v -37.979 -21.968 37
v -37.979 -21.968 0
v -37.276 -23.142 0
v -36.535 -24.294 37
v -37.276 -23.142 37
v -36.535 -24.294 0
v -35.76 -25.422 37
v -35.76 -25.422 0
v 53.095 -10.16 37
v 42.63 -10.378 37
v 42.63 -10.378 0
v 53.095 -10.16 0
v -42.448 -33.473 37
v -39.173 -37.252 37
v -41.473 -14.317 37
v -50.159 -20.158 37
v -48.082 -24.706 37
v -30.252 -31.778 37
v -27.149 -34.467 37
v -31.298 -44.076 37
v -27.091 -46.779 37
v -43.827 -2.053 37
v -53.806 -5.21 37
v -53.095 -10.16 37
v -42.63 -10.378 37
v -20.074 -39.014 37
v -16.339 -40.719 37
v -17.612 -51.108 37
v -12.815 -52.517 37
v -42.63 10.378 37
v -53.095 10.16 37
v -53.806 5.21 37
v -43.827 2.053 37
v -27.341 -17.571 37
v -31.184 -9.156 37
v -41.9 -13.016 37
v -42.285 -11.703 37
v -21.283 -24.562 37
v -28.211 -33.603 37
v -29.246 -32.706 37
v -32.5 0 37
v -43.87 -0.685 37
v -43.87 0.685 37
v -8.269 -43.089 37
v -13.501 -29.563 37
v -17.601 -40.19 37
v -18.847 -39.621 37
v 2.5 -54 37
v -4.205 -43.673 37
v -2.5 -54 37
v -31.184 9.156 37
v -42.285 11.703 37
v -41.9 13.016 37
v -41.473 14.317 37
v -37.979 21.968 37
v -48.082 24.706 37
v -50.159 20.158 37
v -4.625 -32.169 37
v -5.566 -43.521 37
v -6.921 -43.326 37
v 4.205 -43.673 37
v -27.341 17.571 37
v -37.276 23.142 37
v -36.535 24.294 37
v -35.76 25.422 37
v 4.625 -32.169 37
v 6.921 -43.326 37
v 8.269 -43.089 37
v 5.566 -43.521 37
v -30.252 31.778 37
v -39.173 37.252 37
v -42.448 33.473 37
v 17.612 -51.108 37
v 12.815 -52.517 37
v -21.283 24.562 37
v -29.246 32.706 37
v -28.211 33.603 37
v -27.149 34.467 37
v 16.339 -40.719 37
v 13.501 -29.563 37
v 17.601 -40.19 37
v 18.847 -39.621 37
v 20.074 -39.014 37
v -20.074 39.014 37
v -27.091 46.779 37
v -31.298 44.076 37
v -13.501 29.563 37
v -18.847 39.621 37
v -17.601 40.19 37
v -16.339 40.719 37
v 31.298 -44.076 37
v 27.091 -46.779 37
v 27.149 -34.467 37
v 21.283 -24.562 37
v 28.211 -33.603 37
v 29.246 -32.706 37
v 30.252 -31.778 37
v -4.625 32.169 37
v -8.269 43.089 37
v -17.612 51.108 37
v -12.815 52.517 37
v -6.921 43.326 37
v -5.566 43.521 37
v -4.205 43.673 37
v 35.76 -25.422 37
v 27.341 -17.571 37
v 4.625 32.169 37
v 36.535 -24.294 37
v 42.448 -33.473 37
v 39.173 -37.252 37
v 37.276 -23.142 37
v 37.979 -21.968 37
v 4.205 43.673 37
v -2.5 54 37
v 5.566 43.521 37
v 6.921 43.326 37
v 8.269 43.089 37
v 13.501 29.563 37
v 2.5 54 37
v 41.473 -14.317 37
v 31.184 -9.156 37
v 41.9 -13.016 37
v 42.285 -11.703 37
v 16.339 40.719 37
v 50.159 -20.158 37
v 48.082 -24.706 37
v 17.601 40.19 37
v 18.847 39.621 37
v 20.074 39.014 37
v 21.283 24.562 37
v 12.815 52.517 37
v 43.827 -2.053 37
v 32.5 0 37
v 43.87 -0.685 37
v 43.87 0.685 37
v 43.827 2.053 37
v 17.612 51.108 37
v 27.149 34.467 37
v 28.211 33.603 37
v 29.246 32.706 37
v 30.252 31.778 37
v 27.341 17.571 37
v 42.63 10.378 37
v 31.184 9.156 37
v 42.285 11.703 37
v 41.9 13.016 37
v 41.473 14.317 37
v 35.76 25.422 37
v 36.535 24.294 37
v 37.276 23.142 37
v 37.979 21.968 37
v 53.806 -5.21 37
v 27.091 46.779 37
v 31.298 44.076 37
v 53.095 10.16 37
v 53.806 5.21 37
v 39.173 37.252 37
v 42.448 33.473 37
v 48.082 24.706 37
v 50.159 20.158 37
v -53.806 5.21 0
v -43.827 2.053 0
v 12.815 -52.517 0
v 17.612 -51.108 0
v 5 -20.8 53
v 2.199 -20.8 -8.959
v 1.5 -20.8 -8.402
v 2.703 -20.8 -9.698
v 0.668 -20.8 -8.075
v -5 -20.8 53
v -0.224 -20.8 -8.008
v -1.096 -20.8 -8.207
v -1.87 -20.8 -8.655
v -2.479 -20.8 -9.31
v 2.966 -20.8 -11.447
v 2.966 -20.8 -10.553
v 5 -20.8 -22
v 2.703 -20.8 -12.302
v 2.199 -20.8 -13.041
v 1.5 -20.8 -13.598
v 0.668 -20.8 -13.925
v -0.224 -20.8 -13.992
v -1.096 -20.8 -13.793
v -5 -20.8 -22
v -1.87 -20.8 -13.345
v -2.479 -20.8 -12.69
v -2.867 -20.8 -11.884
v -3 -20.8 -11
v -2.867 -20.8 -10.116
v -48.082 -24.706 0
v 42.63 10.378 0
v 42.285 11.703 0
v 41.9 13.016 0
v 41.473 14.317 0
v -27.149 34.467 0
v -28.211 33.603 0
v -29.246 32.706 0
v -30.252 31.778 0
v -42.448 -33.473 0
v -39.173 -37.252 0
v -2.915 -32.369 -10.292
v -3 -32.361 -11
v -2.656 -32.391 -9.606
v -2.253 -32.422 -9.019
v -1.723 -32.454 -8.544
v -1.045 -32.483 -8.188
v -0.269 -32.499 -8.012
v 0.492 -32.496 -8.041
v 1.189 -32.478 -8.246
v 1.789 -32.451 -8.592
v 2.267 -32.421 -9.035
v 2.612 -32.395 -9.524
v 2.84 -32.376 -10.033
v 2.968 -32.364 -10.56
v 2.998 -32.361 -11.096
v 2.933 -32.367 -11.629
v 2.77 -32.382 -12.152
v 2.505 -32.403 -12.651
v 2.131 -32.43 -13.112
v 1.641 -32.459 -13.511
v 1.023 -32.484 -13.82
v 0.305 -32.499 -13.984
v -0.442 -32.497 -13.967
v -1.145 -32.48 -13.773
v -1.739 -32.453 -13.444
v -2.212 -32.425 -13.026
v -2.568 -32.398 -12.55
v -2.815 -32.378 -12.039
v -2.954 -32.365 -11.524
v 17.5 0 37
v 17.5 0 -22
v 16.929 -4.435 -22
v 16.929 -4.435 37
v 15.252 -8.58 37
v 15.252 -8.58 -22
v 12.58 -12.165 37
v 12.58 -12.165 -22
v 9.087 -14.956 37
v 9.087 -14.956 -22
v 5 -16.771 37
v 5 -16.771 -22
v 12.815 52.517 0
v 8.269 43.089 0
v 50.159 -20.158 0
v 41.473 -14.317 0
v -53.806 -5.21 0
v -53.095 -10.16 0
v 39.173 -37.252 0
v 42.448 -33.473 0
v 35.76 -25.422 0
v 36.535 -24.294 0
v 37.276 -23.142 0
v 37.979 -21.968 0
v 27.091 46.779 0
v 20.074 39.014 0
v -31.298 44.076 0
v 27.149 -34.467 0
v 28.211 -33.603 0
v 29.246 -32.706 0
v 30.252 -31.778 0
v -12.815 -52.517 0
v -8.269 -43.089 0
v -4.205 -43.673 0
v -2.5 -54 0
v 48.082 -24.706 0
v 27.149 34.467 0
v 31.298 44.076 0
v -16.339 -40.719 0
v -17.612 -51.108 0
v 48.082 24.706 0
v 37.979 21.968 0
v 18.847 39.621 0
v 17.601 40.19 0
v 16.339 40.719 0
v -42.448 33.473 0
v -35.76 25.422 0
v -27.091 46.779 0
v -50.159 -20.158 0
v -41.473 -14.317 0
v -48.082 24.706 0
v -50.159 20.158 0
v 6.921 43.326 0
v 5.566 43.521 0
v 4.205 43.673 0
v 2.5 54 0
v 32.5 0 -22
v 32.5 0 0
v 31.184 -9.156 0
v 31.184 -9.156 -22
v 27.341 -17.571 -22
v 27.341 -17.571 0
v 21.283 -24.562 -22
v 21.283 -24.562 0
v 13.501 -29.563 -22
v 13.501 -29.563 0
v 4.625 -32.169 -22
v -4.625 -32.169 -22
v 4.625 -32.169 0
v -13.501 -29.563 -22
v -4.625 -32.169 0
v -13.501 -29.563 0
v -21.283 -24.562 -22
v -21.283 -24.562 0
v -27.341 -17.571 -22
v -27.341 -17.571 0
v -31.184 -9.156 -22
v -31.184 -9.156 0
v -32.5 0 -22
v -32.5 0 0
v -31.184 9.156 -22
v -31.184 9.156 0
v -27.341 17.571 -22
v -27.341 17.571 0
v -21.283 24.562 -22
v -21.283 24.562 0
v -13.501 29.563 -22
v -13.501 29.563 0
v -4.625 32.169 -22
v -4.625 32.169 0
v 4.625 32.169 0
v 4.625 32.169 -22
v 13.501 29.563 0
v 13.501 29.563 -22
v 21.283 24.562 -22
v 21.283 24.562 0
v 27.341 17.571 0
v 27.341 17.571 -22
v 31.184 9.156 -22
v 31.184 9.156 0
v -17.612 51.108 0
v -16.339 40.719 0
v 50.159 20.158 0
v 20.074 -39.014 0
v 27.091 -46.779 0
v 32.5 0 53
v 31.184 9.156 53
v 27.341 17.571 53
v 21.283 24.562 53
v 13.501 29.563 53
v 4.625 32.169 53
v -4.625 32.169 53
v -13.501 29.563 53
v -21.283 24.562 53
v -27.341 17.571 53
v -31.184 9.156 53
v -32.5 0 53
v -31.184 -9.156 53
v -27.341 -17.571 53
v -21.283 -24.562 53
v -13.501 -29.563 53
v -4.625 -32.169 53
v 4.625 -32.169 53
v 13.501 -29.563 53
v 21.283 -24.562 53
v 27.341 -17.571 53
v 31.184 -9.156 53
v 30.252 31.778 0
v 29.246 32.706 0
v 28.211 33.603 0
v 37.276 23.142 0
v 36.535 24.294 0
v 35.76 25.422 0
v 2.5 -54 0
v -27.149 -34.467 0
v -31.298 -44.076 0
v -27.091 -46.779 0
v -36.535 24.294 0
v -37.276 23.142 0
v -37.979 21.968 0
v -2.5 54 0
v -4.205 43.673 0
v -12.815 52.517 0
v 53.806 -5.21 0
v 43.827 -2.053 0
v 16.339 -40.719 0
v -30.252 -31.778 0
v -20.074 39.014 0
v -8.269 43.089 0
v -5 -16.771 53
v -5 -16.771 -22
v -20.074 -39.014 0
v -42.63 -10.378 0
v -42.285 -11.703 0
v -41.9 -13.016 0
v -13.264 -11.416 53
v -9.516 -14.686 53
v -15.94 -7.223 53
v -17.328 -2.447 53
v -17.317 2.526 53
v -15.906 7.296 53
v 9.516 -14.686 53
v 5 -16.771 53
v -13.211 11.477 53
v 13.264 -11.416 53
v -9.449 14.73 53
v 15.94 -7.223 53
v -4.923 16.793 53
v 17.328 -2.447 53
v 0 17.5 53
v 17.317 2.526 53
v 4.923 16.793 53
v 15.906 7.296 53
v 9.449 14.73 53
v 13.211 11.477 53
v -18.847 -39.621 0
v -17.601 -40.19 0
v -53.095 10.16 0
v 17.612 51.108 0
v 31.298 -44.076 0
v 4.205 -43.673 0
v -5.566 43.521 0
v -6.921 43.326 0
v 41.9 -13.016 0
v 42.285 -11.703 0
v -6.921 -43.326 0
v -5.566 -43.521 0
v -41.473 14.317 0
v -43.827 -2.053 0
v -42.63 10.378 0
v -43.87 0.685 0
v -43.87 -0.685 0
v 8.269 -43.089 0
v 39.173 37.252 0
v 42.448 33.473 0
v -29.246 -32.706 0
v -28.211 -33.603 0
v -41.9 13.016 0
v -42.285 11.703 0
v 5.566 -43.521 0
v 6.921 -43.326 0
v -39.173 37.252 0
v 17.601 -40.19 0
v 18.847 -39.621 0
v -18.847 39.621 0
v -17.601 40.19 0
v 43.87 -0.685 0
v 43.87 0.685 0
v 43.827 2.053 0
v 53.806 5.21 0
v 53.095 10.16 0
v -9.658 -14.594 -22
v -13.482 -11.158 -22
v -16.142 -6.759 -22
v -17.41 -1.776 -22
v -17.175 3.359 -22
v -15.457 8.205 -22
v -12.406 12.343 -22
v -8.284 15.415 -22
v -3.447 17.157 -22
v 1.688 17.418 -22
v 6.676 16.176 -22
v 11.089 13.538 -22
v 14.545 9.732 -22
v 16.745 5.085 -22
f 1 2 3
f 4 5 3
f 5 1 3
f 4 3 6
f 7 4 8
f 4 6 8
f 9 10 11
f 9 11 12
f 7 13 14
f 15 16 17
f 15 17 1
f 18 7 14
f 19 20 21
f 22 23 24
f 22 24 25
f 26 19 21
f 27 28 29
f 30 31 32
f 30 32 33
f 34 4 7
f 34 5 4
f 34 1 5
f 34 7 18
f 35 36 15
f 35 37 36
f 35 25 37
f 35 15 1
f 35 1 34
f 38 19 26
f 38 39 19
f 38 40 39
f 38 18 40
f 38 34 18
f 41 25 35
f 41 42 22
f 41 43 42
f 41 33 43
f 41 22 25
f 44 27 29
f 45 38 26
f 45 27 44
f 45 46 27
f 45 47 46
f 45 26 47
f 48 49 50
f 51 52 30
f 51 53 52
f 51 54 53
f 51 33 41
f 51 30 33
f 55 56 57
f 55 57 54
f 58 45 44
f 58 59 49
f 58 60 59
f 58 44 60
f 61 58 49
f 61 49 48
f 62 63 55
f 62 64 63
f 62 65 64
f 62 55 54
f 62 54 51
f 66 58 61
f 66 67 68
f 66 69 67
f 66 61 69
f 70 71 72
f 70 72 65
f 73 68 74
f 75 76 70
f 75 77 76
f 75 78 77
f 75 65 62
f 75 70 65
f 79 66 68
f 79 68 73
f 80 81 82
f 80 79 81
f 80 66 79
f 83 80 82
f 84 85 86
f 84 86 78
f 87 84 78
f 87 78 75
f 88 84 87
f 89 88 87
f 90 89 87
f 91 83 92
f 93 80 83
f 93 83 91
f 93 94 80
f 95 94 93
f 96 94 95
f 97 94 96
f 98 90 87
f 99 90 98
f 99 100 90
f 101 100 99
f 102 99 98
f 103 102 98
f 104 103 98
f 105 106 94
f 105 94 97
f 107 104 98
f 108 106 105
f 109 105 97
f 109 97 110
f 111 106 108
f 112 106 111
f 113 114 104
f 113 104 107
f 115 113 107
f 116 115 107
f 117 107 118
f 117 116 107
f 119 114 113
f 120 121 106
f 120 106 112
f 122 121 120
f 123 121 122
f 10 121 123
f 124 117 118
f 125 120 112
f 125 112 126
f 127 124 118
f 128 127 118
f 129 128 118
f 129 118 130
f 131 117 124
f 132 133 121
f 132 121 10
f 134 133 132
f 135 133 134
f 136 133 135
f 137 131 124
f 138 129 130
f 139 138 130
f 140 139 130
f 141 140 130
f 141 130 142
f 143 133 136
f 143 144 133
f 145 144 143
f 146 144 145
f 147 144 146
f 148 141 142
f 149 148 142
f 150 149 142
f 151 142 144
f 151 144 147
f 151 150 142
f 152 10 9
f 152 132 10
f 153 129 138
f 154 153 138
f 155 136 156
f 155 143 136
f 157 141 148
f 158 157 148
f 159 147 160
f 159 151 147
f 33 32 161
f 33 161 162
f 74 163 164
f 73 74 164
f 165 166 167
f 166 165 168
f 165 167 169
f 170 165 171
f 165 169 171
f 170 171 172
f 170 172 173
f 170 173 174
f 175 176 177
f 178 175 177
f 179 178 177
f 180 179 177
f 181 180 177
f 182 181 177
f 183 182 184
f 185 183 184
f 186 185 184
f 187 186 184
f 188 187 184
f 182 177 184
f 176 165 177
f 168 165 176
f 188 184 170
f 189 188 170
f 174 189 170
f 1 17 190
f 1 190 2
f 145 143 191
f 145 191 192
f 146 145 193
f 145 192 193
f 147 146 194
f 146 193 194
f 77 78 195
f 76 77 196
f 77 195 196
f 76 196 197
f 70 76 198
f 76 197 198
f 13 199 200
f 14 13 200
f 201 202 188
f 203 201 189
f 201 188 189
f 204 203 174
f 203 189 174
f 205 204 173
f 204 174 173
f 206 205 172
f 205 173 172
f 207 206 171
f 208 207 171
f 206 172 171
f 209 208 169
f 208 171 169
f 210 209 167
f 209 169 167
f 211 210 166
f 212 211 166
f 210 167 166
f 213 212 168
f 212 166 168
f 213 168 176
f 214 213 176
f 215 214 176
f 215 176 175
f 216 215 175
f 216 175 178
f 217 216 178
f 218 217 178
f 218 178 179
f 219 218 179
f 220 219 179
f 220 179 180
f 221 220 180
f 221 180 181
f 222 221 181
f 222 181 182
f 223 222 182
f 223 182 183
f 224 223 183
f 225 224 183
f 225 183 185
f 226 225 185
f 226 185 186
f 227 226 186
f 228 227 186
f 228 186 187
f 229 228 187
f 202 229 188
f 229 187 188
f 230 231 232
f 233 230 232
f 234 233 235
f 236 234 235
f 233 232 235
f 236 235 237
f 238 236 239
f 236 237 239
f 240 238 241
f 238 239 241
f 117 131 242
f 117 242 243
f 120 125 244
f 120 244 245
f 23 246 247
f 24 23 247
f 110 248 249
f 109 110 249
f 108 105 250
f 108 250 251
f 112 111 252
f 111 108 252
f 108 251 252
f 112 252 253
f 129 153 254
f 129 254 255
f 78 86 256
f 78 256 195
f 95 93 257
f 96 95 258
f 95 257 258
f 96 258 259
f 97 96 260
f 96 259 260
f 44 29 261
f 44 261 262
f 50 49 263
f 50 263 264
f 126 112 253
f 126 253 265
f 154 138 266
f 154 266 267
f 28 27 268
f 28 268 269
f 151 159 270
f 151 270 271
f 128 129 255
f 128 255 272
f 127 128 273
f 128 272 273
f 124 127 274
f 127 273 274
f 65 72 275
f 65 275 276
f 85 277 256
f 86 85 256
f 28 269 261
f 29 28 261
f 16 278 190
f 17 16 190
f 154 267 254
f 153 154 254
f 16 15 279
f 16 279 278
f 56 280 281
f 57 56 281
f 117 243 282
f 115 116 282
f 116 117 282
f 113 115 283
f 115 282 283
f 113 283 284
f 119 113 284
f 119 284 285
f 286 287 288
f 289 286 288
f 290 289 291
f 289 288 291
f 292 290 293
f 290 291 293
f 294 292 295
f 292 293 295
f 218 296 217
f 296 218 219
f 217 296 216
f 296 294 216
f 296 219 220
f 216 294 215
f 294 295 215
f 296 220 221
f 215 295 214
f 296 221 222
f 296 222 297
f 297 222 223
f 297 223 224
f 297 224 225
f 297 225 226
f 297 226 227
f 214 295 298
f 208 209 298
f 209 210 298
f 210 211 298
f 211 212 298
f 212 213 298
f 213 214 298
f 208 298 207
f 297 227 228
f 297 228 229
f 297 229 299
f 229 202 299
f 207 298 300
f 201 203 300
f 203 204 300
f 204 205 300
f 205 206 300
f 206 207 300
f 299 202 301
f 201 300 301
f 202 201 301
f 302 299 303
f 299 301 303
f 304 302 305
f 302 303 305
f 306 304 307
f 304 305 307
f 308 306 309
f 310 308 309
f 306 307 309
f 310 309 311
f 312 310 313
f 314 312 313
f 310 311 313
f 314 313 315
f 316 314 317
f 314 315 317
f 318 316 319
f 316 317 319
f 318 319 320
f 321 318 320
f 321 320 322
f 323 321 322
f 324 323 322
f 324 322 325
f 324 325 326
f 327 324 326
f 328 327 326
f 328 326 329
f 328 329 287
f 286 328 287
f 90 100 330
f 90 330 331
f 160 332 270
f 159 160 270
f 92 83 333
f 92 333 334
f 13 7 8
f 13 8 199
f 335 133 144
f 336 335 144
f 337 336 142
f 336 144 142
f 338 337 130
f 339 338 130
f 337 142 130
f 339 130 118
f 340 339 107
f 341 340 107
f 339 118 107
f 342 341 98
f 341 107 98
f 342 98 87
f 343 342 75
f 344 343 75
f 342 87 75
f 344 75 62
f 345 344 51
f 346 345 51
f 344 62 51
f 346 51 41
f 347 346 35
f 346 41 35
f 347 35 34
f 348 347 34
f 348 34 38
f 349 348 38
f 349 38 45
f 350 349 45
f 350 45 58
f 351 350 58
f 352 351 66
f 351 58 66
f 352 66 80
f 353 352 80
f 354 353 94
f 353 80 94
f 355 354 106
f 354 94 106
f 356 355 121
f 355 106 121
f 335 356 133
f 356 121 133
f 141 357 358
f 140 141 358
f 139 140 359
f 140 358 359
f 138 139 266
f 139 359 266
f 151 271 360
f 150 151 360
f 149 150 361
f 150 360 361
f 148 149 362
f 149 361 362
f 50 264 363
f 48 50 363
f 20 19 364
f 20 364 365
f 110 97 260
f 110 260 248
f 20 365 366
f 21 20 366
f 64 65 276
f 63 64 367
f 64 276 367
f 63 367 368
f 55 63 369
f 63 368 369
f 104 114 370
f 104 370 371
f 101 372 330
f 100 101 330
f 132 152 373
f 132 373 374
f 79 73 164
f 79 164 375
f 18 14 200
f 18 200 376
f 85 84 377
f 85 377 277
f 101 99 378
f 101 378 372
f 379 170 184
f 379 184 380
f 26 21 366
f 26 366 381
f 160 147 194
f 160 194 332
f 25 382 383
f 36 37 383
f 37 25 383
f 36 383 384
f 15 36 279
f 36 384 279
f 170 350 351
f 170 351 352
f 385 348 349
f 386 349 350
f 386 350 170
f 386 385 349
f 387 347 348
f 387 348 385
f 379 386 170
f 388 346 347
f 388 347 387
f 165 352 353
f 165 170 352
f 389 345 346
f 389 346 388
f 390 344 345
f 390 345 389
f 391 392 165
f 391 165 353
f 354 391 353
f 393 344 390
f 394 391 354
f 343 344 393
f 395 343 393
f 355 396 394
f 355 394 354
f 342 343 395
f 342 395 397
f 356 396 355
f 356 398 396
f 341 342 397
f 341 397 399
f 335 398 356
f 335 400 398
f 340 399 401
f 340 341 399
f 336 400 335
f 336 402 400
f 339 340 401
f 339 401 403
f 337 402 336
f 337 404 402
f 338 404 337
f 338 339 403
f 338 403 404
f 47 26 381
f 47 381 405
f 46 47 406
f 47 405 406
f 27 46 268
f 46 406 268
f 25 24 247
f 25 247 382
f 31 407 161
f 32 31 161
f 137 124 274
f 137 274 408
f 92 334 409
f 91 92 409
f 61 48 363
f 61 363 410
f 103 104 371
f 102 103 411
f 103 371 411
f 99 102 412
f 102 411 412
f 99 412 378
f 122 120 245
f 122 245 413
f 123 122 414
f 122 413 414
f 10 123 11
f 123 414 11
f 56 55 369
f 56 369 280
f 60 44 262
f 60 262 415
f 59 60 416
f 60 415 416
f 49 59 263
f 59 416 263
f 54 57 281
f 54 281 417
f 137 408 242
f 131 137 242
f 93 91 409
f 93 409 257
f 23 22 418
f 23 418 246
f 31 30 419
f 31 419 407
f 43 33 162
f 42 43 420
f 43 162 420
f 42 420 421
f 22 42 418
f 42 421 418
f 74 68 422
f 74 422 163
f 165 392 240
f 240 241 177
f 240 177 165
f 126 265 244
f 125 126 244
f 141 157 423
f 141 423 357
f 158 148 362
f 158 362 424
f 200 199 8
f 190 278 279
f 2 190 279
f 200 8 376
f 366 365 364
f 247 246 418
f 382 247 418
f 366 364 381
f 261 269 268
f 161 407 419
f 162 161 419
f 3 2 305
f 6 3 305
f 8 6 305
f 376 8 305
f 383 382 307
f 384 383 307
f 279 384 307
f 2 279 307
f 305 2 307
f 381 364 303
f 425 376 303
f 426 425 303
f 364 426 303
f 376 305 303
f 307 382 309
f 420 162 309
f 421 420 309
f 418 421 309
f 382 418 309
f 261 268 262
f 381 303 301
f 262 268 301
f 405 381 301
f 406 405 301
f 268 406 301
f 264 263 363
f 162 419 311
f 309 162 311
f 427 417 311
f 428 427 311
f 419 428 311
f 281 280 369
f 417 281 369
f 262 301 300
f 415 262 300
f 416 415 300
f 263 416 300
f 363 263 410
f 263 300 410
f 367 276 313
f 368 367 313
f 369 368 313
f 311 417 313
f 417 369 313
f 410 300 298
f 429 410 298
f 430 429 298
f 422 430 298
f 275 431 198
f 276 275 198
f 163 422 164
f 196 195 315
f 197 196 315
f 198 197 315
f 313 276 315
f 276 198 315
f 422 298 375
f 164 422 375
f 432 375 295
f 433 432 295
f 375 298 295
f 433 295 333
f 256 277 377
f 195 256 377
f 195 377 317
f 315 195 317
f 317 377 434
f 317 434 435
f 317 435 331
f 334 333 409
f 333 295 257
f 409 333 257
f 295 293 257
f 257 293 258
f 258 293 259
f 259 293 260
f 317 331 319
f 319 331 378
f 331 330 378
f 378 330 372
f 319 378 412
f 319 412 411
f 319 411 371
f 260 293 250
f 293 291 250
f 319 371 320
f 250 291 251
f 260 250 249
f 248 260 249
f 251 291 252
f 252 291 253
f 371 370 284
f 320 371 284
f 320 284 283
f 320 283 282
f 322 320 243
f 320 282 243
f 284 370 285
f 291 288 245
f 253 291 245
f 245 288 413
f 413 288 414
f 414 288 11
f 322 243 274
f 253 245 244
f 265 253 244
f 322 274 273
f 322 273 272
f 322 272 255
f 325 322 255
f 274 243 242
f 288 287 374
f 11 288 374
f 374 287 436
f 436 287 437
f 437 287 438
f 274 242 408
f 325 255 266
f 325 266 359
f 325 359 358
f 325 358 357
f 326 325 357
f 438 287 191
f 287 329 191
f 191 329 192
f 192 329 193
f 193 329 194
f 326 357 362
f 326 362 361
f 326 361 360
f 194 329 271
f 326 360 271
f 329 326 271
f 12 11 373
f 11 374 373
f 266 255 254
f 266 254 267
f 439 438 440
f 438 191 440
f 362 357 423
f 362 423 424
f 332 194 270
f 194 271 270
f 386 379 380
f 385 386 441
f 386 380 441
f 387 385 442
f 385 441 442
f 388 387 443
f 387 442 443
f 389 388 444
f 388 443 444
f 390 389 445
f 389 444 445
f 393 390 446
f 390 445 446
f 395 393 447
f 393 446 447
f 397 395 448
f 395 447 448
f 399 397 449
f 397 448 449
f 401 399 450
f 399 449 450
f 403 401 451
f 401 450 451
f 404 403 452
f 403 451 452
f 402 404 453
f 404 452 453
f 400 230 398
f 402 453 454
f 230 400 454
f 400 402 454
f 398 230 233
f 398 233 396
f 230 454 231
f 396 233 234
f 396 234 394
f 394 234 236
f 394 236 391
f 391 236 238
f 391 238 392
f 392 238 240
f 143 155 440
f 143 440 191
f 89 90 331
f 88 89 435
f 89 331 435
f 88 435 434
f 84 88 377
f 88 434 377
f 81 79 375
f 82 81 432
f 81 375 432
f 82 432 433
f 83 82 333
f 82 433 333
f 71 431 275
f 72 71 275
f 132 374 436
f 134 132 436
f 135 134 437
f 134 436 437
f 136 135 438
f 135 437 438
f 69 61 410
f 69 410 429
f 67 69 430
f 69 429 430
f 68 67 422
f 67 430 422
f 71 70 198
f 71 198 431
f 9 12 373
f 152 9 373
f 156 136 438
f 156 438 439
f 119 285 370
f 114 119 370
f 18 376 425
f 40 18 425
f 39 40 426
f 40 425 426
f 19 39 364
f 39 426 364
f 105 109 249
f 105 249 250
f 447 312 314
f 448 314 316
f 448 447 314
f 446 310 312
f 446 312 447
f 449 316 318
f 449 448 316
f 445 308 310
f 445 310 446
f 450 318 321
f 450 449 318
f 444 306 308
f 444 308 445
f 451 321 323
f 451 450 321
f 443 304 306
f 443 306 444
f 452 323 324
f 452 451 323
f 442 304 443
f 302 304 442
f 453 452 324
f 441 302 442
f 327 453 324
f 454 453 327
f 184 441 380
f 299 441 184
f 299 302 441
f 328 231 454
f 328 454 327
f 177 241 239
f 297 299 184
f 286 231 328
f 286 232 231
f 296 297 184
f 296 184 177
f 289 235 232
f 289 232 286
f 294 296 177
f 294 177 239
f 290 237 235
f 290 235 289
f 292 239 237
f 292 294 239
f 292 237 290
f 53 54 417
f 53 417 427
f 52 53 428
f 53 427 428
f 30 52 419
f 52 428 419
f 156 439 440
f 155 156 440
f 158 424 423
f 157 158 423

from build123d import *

# Parameters (mm, degrees)
F0_R      = 43.875
F1_DEPTH  = 37
F3_DEPTH  = 37
F5_COUNT  = 22
F6_R      = 32.5
F7_DEPTH  = 22
F9_DEPTH  = 59.001
F10_R     = 3
F11_DEPTH = 33.201
F12_R     = 32.5
F13_DEPTH = 16


with BuildPart() as f1:
    # F0 (on Top) → F1 (new body)
    with BuildSketch(Plane.XY):
        Circle(F0_R)
    extrude(amount=F1_DEPTH)

    # F2 (on face) → F3 (join, through all)
    with BuildSketch(Plane.XY.offset(37)):
        with BuildLine():
            ThreePointArc((-4.2052323918, 43.6730082034), (0, 43.875), (4.2052323918, 43.6730082034))
            Line((4.2052323918, 43.6730082034), (2.5, 54))
            Line((2.5, 54), (-2.5, 54))
            Line((-2.5, 54), (-4.2052323918, 43.6730082034))
        make_face()
        with BuildLine():
            ThreePointArc((-4.2052323918, 43.6730082034), (-29.5000936762, -32.4770703435), (43.875, 0))
            ThreePointArc((43.875, 0), (32.4770703435, 29.5000936762), (4.2052323918, 43.6730082034))
            ThreePointArc((4.2052323918, 43.6730082034), (0, 43.875), (-4.2052323918, 43.6730082034))
        make_face()
    extrude(amount=-F3_DEPTH)

    # F5: F1 ×22 about axis
    f5_axis = Axis((0, 0, 35), (0, 0, 1))


with BuildPart() as f1_1:
    add(f1.part)
    for i in range(1, F5_COUNT):
        add(f1.part.rotate(f5_axis, i * 360 / F5_COUNT))

    # F6 (on face) → F7 (join)
    with BuildSketch(Plane(origin=(0, 0, 0), x_dir=(1, 0, 0), z_dir=(0, 0, -1))):
        Circle(F6_R)
    extrude(amount=F7_DEPTH)

    # F8 (on face) → F9 (cut, through all)
    with BuildSketch(Plane(origin=(0, 0, -22), x_dir=(1, 0, 0), z_dir=(0, 0, -1))):
        with BuildLine():
            Line((5, 0), (5, 16.7705098312))
            ThreePointArc((5, 16.7705098312), (0, 17.5), (-5, 16.7705098312))
            Line((-5, 16.7705098312), (-5, 0))
            Line((-5, 0), (5, 0))
        make_face()
        with BuildLine():
            ThreePointArc((-5, 16.7705098312), (0, 17.5), (5, 16.7705098312))
            Line((5, 16.7705098312), (5, 20.8))
            Line((5, 20.8), (-5, 20.8))
            Line((-5, 20.8), (-5, 16.7705098312))
        make_face()
        with BuildLine():
            ThreePointArc((-5, 16.7705098312), (-10.4582503317, -14.0312152004), (17.5, 0))
            ThreePointArc((17.5, 0), (14.0312152004, 10.4582503317), (5, 16.7705098312))
            Line((5, 16.7705098312), (5, 0))
            Line((5, 0), (-5, 0))
            Line((-5, 0), (-5, 16.7705098312))
        make_face()
    extrude(amount=-F9_DEPTH, mode=Mode.SUBTRACT)

    # F10 (on face) → F11 (cut, through all)
    with BuildSketch(Plane(origin=(0, -20.8, 0), x_dir=(-1, 0, 0), z_dir=(0, 1, 0))):
        with Locations((0, -11)):
            Circle(F10_R)
    extrude(amount=-F11_DEPTH, mode=Mode.SUBTRACT)

    # F12 (on face) → F13 (join)
    with BuildSketch(Plane.XY.offset(37)):
        Circle(F12_R)
        with BuildLine():
            ThreePointArc((-5, -16.7705098312), (0, 17.5), (5, -16.7705098312))
            Line((5, -16.7705098312), (5, -20.8))
            Line((5, -20.8), (-5, -20.8))
            Line((-5, -20.8), (-5, -16.7705098312))
        make_face(mode=Mode.SUBTRACT)
    extrude(amount=F13_DEPTH)


solid = f1_1.part
